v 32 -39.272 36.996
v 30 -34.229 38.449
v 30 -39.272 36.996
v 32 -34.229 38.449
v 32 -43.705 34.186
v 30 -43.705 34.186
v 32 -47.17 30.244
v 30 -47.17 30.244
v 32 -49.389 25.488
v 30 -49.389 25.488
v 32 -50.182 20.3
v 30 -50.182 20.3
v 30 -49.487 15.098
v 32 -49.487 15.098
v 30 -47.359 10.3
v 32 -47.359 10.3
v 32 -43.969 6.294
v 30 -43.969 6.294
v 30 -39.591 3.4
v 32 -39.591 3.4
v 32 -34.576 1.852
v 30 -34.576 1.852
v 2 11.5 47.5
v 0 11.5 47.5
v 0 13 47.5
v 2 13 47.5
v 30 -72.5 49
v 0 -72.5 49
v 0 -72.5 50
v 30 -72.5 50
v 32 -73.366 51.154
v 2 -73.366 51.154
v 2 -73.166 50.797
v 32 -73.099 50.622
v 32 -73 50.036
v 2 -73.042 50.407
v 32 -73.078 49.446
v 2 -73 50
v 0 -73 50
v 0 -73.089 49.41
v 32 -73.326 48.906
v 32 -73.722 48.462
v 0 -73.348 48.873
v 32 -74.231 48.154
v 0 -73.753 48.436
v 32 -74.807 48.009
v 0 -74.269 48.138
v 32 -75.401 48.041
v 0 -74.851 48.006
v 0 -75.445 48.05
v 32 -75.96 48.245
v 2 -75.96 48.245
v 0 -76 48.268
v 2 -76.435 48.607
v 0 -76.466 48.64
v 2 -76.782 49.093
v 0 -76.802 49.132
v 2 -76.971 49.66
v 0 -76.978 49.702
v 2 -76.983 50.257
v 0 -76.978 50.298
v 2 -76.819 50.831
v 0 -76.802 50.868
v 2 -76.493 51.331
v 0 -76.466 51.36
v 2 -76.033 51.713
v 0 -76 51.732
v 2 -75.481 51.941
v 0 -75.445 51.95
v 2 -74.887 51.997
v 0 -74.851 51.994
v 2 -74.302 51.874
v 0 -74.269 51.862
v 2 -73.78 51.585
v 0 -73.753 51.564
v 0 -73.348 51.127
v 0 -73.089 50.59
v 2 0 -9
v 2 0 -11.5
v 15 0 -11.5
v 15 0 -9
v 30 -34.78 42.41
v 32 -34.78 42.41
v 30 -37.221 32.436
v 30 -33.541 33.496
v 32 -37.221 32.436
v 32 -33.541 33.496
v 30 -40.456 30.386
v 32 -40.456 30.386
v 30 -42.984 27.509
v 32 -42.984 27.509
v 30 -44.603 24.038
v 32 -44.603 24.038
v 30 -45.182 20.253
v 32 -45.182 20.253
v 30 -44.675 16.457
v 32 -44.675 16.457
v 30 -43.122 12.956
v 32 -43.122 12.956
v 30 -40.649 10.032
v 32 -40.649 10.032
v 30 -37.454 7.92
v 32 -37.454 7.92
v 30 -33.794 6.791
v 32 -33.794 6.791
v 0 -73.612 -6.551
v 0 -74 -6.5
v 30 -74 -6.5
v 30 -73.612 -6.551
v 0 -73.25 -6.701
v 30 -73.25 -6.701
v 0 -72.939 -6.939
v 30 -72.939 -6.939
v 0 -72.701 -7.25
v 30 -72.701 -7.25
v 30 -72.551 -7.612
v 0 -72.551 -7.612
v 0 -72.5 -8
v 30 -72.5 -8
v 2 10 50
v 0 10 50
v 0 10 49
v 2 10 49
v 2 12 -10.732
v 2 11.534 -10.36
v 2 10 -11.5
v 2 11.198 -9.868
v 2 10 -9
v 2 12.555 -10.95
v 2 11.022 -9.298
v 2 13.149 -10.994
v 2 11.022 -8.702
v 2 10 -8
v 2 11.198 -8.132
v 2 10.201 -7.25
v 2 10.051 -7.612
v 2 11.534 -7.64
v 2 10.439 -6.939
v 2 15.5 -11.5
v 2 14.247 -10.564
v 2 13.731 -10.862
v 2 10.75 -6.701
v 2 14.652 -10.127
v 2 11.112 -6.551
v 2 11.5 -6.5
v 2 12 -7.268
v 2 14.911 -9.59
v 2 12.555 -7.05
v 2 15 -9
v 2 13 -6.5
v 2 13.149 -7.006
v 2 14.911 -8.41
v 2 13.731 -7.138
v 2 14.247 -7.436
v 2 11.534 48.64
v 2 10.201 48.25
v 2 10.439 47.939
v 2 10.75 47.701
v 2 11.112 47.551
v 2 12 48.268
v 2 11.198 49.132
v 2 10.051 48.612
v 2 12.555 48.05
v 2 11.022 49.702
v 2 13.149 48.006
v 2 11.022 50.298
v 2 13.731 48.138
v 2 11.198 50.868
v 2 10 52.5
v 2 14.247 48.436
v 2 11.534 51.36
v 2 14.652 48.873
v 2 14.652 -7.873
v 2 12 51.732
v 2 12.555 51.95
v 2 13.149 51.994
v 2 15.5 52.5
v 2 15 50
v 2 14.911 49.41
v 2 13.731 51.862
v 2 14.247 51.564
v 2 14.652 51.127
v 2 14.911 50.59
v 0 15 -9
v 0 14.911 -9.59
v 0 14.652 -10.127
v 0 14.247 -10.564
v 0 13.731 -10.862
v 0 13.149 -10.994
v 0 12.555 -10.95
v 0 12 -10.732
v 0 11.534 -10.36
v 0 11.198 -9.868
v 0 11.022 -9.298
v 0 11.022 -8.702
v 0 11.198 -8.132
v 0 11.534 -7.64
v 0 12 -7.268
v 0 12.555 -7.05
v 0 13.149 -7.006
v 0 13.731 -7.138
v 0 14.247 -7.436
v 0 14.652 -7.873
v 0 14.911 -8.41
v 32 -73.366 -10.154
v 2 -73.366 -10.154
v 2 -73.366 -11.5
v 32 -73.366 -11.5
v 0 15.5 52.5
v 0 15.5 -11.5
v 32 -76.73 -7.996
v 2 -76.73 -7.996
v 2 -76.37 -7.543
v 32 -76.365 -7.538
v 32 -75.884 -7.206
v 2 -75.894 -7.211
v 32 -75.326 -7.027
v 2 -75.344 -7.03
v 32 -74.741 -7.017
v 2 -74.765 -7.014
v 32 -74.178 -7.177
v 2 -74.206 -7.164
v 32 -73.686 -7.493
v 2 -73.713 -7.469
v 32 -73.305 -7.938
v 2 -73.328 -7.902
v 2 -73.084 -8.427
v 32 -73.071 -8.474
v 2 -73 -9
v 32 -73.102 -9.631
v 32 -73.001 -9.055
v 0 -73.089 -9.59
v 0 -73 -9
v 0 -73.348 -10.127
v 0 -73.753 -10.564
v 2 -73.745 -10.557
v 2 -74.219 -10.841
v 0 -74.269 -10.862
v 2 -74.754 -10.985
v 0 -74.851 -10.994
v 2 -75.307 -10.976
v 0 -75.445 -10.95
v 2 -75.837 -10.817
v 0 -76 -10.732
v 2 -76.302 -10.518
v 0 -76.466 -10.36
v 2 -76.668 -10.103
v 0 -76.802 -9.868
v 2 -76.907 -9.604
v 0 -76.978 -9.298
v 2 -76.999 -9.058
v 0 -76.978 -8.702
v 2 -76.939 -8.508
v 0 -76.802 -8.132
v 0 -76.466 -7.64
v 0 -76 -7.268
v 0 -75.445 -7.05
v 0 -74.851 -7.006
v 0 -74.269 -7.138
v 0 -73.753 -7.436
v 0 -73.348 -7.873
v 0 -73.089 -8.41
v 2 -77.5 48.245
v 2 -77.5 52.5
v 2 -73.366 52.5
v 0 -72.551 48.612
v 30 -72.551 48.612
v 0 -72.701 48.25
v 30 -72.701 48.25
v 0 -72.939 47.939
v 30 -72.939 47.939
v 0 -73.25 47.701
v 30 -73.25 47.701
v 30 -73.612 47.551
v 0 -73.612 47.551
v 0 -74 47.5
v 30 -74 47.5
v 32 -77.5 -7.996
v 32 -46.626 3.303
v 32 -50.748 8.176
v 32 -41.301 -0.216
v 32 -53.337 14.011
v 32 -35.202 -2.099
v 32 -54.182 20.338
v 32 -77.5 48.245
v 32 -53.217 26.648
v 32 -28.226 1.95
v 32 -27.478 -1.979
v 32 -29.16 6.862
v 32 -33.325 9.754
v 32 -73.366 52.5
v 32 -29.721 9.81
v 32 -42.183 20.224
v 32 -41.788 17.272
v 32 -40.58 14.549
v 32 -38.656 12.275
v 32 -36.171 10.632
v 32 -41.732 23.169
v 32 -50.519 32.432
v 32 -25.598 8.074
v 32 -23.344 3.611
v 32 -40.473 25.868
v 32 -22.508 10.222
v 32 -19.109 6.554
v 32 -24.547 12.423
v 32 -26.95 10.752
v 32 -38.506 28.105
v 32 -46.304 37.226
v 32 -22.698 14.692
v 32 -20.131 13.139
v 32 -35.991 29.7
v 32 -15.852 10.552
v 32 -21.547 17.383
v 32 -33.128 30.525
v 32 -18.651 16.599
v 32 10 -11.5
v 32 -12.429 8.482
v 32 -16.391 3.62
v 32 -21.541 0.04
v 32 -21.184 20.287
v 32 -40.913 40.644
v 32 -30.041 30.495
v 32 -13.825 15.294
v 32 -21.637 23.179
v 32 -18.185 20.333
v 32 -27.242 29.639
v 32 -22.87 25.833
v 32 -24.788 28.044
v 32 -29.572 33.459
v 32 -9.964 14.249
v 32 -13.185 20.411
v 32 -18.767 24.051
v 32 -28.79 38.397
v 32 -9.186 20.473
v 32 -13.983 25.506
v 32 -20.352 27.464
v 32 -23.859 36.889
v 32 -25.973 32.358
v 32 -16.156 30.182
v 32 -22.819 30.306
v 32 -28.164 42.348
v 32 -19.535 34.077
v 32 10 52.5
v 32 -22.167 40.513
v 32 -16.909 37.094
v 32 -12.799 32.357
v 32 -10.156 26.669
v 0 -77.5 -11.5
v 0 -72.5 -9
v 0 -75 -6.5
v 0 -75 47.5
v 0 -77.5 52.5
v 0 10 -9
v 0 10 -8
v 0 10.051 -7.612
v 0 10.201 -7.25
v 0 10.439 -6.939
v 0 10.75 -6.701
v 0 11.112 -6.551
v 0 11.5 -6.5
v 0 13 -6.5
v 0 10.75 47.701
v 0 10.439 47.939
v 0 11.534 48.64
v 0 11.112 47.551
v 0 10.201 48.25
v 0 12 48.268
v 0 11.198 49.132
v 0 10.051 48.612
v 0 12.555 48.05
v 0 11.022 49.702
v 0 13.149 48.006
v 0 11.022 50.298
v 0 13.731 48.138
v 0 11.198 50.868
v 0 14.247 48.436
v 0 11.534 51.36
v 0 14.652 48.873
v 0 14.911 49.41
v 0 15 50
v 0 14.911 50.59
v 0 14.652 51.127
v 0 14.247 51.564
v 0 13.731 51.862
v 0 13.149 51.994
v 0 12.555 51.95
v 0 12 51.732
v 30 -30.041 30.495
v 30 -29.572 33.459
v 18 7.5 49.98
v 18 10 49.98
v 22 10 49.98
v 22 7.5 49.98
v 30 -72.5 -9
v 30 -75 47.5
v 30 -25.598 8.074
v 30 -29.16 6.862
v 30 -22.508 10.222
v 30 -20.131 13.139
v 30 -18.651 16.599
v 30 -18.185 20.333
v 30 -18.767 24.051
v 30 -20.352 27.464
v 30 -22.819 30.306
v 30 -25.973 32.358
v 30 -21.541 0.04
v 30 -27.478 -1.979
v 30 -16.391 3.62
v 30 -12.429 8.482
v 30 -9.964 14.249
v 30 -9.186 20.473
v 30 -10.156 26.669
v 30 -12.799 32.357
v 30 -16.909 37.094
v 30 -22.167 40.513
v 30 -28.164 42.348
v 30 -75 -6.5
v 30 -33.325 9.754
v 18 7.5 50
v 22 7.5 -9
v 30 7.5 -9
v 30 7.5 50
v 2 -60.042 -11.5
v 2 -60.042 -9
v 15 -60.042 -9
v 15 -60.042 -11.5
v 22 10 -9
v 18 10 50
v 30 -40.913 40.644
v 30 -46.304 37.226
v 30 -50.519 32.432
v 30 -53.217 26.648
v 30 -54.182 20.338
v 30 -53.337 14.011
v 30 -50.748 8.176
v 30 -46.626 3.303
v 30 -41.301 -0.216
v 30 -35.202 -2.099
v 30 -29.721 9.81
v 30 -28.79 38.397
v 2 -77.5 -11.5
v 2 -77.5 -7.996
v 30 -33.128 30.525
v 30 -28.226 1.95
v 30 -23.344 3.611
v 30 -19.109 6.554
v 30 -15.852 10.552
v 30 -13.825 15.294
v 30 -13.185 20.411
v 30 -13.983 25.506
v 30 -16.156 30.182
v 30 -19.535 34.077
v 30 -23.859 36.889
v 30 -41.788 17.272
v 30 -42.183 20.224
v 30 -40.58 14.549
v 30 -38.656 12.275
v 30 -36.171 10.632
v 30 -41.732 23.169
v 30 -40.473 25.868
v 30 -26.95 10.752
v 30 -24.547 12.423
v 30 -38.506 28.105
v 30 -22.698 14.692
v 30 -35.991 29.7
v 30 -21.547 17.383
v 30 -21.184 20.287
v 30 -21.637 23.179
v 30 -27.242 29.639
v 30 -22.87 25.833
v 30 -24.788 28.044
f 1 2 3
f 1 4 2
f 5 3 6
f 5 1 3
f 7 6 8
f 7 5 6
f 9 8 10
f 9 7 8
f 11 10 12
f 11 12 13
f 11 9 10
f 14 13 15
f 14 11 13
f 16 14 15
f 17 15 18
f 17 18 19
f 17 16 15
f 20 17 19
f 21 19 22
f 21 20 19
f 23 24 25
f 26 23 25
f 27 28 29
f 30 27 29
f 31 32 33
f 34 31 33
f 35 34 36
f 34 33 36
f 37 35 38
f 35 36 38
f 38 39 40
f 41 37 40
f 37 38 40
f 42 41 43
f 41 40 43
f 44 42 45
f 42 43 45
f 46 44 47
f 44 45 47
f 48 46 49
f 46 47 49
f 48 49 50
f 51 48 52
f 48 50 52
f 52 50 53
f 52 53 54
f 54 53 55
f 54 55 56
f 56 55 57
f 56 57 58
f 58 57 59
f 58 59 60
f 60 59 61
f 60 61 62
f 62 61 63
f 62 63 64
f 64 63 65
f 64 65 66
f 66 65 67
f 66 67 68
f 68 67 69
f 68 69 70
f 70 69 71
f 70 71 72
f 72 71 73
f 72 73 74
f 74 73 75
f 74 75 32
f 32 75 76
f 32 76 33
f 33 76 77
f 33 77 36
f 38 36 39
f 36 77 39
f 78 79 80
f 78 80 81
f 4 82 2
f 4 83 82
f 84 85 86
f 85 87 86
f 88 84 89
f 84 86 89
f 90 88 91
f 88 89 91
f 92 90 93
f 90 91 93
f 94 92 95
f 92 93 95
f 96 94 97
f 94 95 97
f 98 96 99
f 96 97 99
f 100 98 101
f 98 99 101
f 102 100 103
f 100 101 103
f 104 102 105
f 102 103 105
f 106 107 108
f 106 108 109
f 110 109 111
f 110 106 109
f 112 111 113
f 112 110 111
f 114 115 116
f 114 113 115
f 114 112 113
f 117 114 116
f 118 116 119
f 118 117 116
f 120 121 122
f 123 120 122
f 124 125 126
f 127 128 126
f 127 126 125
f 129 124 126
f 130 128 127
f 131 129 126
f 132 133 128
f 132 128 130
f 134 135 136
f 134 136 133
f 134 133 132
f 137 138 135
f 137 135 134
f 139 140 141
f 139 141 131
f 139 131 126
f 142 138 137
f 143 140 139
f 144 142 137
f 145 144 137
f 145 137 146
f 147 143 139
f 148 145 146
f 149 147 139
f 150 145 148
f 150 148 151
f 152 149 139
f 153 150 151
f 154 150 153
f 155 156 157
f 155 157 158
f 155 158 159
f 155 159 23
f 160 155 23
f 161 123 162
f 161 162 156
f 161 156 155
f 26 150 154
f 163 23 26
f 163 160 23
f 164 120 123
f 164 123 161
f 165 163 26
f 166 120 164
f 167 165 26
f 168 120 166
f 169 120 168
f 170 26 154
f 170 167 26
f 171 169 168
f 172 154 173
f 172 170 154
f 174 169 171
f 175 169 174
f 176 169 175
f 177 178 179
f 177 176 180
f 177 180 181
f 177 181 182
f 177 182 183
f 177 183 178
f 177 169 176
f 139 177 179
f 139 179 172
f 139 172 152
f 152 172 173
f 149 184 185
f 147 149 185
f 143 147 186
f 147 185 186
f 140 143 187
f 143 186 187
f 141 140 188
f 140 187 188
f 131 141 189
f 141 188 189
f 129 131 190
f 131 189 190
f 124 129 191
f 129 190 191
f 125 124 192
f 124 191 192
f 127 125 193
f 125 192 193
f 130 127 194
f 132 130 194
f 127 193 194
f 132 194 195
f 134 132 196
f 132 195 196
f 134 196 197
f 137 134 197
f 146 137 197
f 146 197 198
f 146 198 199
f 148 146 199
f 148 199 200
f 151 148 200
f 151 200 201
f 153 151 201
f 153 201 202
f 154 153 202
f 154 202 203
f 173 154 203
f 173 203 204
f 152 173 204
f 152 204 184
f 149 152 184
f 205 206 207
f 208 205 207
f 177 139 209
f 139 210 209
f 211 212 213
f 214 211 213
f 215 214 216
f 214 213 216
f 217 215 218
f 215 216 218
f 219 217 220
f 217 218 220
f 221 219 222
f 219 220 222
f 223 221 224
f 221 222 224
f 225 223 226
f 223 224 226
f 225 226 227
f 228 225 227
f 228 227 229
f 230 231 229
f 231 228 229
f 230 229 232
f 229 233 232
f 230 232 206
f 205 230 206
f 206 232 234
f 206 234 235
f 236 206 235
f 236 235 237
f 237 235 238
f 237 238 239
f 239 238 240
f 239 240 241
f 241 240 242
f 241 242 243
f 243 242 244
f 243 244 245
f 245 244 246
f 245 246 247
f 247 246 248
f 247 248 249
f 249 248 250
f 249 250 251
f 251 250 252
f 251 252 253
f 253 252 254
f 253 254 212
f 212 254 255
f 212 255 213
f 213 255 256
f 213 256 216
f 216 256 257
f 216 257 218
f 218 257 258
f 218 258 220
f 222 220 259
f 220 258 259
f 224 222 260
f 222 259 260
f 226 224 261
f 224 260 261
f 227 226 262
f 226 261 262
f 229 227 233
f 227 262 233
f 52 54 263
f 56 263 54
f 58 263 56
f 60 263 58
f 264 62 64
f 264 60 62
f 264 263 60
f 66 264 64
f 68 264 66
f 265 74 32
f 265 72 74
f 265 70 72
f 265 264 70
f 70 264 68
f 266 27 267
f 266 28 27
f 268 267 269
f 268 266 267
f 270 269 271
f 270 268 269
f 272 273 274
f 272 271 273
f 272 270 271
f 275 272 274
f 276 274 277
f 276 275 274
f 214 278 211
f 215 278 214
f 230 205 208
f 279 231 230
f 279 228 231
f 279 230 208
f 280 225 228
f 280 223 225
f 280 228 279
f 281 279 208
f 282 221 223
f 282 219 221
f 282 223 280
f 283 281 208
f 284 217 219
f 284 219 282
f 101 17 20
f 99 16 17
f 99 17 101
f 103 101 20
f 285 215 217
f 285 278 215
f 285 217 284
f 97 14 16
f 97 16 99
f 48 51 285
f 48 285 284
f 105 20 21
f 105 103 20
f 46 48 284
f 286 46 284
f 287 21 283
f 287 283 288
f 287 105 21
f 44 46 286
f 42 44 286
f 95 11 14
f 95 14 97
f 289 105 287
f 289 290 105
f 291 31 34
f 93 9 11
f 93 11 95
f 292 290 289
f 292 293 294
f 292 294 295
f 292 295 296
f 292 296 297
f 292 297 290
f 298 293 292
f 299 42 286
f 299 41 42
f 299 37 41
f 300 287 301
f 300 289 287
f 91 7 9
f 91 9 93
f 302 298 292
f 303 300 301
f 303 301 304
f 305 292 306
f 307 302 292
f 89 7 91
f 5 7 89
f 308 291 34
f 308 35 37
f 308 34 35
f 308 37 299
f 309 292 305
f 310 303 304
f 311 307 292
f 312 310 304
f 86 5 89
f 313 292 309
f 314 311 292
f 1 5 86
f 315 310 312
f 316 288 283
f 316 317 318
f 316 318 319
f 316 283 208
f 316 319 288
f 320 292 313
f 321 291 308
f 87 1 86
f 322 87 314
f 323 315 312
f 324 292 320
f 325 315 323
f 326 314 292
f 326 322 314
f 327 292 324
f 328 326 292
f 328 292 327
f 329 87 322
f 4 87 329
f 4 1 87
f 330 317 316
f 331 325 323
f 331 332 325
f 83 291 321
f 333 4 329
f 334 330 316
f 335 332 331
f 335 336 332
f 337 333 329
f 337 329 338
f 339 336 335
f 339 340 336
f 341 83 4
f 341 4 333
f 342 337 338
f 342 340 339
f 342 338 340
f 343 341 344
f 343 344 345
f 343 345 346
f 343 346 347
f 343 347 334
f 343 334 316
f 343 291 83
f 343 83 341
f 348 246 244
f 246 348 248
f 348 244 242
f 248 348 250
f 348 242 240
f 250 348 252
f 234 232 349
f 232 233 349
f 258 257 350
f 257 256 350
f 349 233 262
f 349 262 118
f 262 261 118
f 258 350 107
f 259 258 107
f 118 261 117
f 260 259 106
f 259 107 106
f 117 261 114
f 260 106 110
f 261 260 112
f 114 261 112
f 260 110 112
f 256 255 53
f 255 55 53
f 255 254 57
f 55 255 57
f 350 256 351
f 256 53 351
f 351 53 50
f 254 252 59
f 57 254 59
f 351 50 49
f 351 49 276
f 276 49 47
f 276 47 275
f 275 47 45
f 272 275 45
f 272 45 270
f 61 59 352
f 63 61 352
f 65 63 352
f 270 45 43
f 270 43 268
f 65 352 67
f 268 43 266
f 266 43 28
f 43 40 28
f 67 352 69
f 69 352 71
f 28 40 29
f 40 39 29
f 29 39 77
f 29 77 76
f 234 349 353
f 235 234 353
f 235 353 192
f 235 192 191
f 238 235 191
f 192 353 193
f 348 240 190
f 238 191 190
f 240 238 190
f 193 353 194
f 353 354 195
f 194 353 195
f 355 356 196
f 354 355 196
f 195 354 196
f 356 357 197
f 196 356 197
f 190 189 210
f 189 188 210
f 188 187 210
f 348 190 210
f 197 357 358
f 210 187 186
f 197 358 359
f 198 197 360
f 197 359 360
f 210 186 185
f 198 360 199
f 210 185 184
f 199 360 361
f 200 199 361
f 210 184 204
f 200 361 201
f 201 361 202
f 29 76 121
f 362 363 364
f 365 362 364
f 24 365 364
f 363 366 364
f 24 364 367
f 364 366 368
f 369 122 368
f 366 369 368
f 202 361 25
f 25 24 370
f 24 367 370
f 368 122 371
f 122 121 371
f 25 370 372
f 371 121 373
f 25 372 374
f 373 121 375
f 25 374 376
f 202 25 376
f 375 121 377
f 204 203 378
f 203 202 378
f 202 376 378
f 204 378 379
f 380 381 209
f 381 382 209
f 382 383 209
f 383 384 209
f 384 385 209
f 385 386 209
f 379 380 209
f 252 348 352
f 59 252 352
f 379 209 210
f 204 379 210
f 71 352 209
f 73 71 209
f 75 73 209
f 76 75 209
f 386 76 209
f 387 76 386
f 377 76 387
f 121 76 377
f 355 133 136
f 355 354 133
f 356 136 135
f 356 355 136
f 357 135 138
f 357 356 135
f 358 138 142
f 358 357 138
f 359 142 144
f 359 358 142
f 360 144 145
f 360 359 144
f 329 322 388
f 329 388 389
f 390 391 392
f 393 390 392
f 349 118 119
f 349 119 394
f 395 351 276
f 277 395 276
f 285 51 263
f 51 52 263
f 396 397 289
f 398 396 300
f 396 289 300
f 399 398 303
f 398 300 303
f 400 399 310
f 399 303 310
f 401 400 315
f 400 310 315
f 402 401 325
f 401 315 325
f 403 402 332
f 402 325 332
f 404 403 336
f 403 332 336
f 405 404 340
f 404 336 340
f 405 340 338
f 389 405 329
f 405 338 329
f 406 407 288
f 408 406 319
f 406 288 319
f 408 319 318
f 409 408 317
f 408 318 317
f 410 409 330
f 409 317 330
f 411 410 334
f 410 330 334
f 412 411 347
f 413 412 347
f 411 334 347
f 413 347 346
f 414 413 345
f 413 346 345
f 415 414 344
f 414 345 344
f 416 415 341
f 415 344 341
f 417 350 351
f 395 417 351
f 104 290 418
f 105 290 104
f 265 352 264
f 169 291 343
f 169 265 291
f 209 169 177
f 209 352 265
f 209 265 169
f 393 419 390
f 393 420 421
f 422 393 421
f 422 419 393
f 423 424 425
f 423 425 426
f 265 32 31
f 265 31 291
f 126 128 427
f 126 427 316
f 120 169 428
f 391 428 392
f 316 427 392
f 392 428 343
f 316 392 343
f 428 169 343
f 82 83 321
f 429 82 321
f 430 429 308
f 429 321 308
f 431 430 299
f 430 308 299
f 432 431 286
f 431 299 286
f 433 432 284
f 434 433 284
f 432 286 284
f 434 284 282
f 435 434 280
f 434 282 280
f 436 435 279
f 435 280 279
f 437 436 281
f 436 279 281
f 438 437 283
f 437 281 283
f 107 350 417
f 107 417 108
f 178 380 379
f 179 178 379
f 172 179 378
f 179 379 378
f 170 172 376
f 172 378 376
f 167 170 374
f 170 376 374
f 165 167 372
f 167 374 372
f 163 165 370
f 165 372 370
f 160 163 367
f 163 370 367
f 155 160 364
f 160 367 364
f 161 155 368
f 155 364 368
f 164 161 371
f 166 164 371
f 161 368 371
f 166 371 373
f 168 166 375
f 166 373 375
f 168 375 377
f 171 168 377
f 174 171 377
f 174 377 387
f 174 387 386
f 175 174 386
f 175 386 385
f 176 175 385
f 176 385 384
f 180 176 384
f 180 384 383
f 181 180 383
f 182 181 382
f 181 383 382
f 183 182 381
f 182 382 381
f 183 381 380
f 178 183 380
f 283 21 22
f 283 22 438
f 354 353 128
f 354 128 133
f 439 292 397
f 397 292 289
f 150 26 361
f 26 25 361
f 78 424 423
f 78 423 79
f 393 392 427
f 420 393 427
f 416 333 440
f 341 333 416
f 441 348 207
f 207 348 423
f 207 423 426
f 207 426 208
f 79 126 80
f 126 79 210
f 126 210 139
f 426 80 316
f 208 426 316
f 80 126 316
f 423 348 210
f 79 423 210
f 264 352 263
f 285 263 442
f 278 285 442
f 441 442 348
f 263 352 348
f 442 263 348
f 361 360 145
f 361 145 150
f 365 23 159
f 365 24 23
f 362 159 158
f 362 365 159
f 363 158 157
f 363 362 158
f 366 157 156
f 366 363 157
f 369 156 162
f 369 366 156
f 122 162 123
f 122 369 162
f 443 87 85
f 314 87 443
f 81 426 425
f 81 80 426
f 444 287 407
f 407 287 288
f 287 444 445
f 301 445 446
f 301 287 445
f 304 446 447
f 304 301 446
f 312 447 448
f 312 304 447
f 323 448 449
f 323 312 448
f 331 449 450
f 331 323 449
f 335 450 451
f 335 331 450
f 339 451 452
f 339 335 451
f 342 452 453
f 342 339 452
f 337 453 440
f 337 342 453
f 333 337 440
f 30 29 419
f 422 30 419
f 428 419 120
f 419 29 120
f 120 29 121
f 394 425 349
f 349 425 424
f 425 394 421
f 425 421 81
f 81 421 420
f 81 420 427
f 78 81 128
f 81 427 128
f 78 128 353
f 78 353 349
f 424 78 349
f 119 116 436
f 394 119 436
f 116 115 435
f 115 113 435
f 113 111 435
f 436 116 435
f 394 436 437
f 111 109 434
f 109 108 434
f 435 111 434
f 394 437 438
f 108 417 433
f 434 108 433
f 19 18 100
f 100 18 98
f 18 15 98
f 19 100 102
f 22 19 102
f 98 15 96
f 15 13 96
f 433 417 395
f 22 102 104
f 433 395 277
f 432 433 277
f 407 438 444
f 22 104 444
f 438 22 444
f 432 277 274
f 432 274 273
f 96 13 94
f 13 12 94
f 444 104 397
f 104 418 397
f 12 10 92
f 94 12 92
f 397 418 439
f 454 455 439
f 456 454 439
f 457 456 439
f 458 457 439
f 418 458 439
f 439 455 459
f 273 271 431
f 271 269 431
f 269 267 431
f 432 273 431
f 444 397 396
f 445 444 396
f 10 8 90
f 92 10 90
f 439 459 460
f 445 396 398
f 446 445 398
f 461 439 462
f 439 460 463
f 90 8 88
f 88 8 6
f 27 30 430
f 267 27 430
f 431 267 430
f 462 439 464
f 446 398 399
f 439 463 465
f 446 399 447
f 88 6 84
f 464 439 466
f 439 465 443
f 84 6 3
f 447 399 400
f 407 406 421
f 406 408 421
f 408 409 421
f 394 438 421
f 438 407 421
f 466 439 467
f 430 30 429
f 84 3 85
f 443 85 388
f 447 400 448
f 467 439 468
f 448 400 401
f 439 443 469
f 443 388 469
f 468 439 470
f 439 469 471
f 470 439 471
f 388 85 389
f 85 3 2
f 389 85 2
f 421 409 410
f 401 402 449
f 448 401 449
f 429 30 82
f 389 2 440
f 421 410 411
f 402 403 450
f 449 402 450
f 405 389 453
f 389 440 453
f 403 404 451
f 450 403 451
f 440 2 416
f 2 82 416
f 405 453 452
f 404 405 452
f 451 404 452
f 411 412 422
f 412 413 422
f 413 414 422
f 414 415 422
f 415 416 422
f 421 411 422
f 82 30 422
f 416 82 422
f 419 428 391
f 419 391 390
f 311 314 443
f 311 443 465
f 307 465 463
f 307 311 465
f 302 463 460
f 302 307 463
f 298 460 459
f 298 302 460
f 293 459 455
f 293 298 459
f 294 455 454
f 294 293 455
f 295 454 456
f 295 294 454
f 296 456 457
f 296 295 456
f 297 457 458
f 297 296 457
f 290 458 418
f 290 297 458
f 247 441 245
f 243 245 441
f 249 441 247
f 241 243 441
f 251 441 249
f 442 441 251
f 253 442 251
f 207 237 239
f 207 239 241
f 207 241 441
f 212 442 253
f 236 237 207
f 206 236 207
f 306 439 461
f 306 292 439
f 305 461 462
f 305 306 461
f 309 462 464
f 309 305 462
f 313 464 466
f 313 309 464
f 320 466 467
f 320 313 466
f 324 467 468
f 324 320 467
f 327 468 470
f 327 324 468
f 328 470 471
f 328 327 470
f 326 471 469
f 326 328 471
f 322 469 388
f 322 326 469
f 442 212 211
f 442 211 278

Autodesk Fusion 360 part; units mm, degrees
sketch "Sketch1" plane through (0, 0, 0) normal (1, 0, 0) x (0, 1, 0)
  line L0 (-75, 50) -> (13, 50)
  line L1 (13, 50) -> (13, -9)
  line L2 (13, -9) -> (-75, -9)
  line L3 (-75, -9) -> (-75, 50)
  circle A0 centre (-75, 50) radius 2
  circle A1 centre (13, 50) radius 2
  circle A2 centre (-75, -9) radius 2
  circle A3 centre (13, -9) radius 2
  line L4 (-77.5, 52.5) -> (-77.5, 47.5)
  line L5 (-77.5, 47.5) -> (-74, 47.5)
  line L6 (-72.5, 49) -> (-72.5, 52.5)
  line L7 (-72.5, 52.5) -> (10, 52.5)
  line L8 (10, 52.5) -> (10, 49)
  line L9 (11.5, 47.5) -> (15.5, 47.5)
  line L10 (15.5, 47.5) -> (15.5, 52.5)
  line L11 (15.5, 52.5) -> (10, 52.5)
  line L12 (-75, 20.5) -> (-35, 20.5)
  line L13 (-77.5, -11.5) -> (-77.5, -6.5)
  line L14 (-77.5, -6.5) -> (-74, -6.5)
  line L15 (-72.5, -8) -> (-72.5, -11.5)
  line L16 (-72.5, -11.5) -> (10, -11.5)
  line L17 (10, -11.5) -> (10, -8)
  line L18 (11.5, -6.5) -> (15.5, -6.5)
  line L19 (15.5, -6.5) -> (15.5, -11.5)
  line L20 (15.5, -11.5) -> (10, -11.5)
  line L21 (-77.5, 52.5) -> (-72.5, 52.5)
  line L22 (-77.5, 47.5) -> (-77.5, -11.5)
  line L23 (-77.5, -11.5) -> (-72.5, -11.5)
  arc A4 (-74, 47.5) -> (-72.5, 49) centre (-74, 49) ccw
  arc A5 (-72.5, -8) -> (-74, -6.5) centre (-74, -8) ccw
  arc A6 (11.5, -6.5) -> (10, -8) centre (11.5, -8) ccw
  arc A7 (10, 49) -> (11.5, 47.5) centre (11.5, 49) ccw
  line L24 (15.5, 47.5) -> (15.5, -6.5)
  dimension "d1" = 88
  dimension "d2" = 59
  dimension "d3" = 4
  dimension "d4" = 4
  dimension "d5" = 4
  dimension "d6" = 4
  dimension "d7" = 1.5
extrude "Extrude1" add sketch "Sketch1" along normal blind 2 contours L0 L3 A0 L4 L5 L6 L21 | L0 L3 A0 L5 L6 A4 | L0 L6 L7 L8 | L3 L5 L14 L22 | L0 L1 A1 L8 L9 L10 L11 | L0 L1 A1 L8 L9 A7 | L2 L3 A2 L14 L15 A5 | L2 L3 A2 L13 L14 L15 L22 L23 | L1 L9 L18 L24 | L2 L15 L16 L17 | L1 L2 A3 L17 L18 L19 L20 | L1 L2 A3 L17 L18 A6
sketch "Sketch2" plane through (2, 0, 0) normal (1, 0, 0) x (0, 1, 0)
  line L0 (-74, -6.5) -> (-75, -6.5)
  line L1 (-75, -6.5) -> (-75, 47.5)
  line L2 (-75, 47.5) -> (-74, 47.5)
  arc A0 (-74, 47.5) -> (-72.5, 49) centre (-74, 49) ccw
  line L3 (-72.5, 49) -> (-72.5, 50)
  line L4 (-72.5, 50) -> (10, 50)
  line L5 (10, 50) -> (10, 49)
  arc A1 (10, 49) -> (11.5, 47.5) centre (11.5, 49) ccw
  line L6 (11.5, 47.5) -> (13, 47.5)
  line L7 (13, 47.5) -> (13, -6.5)
  line L8 (13, -6.5) -> (11.5, -6.5)
  arc A2 (11.5, -6.5) -> (10, -8) centre (11.5, -8) ccw
  line L9 (10, -8) -> (10, -9)
  line L10 (10, -9) -> (-72.5, -9)
  line L11 (-72.5, -9) -> (-72.5, -8)
  arc A3 (-72.5, -8) -> (-74, -6.5) centre (-74, -8) ccw
  circle A4 centre (13, 50) radius 2
  circle A5 centre (13, -9) radius 2
  circle A6 centre (-75, -9) radius 2
  circle A7 centre (-75, 50) radius 2
  line L12 (15.5, 52.5) -> (-77.5, 52.5)
  line L13 (-77.5, 52.5) -> (-77.5, -11.5)
  line L14 (-77.5, -11.5) -> (15.5, -11.5)
  line L15 (15.5, -11.5) -> (15.5, 52.5)
  line L16 (-75.9596, 48.2453) -> (-77.5, 48.2453)
  line L17 (-73.3661, 51.1535) -> (-73.3661, 52.5)
  line L18 (-76.7298, -7.9961) -> (-77.5, -7.9961)
  line L19 (-73.3661, -10.1535) -> (-73.3661, -11.5)
  line L20 (-60.0421, -9) -> (-60.0421, -11.5)
  line L21 (10, 50) -> (10, 52.5)
  line L22 (0, -11.5) -> (0, -9)
  line L23 (10, -9) -> (10, -11.5)
extrude "Extrude2" add sketch "Sketch2" along normal blind 30 contours L0 L1 L2 A0 L3 L4 L10 L11 A3 A6 A7 L12 L13 L14 L16 L17 L18 L19 L20 L21 | L10 L14 L22 L23
sketch "Sketch3" plane through (0, 0, 50) normal (0, 0, -1) x (1, 0, 0)
  line L0 (0, 72.5) -> (0, -10)
  line L1 (0, -10) -> (2, -10)
  line L2 (2, -10) -> (32, -10)
  line L3 (32, -10) -> (32, 72.5)
  line L4 (32, 72.5) -> (0, 72.5)
  line L5 (32, -10) -> (18, -10)
  line L6 (18, -10) -> (18, -7.5)
  line L7 (18, -7.5) -> (32, -7.5)
  line L8 (32, -7.5) -> (32, -10)
  dimension "d12" = 14
  dimension "d13" = 2.5
extrude "Extrude3" add sketch "Sketch3" along normal up to surface (59 mm away) contours L2 L3 L5 L6 L7 L8
sketch "Sketch4" plane through (0, 0, 0) normal (0, -1, 0) x (1, 0, 0)
  line L0 (2, -9) -> (2, -11.5)
  line L1 (2, -11.5) -> (32, -11.5)
  line L2 (32, -11.5) -> (32, -9)
  line L3 (32, -9) -> (2, -9)
  line L4 (32, -11.5) -> (15, -11.5)
  line L5 (15, -11.5) -> (15, -9)
  line L6 (15, -9) -> (32, -9)
  line L7 (32, -9) -> (32, -11.5)
extrude "Extrude4" add sketch "Sketch4" along normal up to surface (60.0421 mm away) contours L1 L2 L3 L4 L5 L6 L7
sketch "Sketch5" plane through (0, 10, 0) normal (0, 1, 0) x (-1, 0, 0)
  line L0 (-2, -11.5) -> (-2, -9)
  line L1 (-2, -9) -> (-18, -9)
  line L2 (-18, -9) -> (-18, 50)
  line L3 (-18, 50) -> (-2, 50)
  line L4 (-2, 50) -> (-2, 52.5)
  line L5 (-2, 52.5) -> (-32, 52.5)
  line L6 (-32, 52.5) -> (-32, -11.5)
  line L7 (-32, -11.5) -> (-2, -11.5)
  line L8 (-18, 29.9805) -> (-22, 29.9805)
  line L9 (-22, 29.9805) -> (-22, -9)
  line L10 (-22, -9) -> (-18, -9)
extrude "Extrude5" cut sketch "Sketch5" against normal blind 6 contours L2 L8 L9 L10
sketch "Sketch6" plane through (32, 0, 0) normal (1, 0, 0) x (0, 1, 0)
  line L0 (-73.3661, -11.5) -> (10, -11.5)
  line L1 (10, -11.5) -> (10, 52.5)
  line L2 (10, 52.5) -> (-73.3661, 52.5)
  line L3 (-73.3661, 52.5) -> (-73.3661, 51.1535)
  arc A0 (-75.9596, 48.2453) -> (-73.3661, 51.1535) centre (-75, 50) ccw
  line L4 (-75.9596, 48.2453) -> (-77.5, 48.2453)
  line L5 (-77.5, 48.2453) -> (-77.5, -7.9961)
  line L6 (-77.5, -7.9961) -> (-76.7298, -7.9961)
  arc A1 (-73.3661, -10.1535) -> (-76.7298, -7.9961) centre (-75, -9) ccw
  line L7 (-73.3661, -10.1535) -> (-73.3661, -11.5)
  line L8 (7.5, -9) -> (-72.5, -9)
  line L9 (-72.5, -9) -> (-72.5, -8)
  arc A2 (-72.5, -8) -> (-74, -6.5) centre (-74, -8) ccw
  line L10 (-74, -6.5) -> (-75, -6.5)
  line L11 (-75, -6.5) -> (-75, 47.5)
  line L12 (-75, 47.5) -> (-74, 47.5)
  arc A3 (-74, 47.5) -> (-72.5, 49) centre (-74, 49) ccw
  line L13 (-72.5, 49) -> (-72.5, 50)
  line L14 (-72.5, 50) -> (7.5, 50)
  line L15 (7.5, 50) -> (7.5, -9)
  line L16 (-75, 47.5) -> (-73.5326, 47.9393)
  line L17 (-73.5326, 47.9393) -> (-72.7, 50.4)
  line L18 (-72.7, 50.4) -> (9, 51)
  line L19 (9, 51) -> (9, -10.6409)
  line L20 (9, -10.6409) -> (-72.5, -10.6409)
  line L21 (-72.5, -10.6409) -> (-73, -7.5)
  line L22 (-73, -7.5) -> (-74.2896, -6.8066)
  line L23 (-74.2896, -6.8066) -> (-75.5, -6.5)
  line L24 (-75.5, -6.5) -> (-75, 47.5)
extrude "Extrude6" add sketch "Sketch6" against normal blind 2 contours L8 L9 A2 L10 L11 L12 A3 L13 L14 L15
sketch "Sketch7" plane through (32, 0, 0) normal (1, 0, 0) x (0, 1, 0)
  line L0 (-73.3661, -11.5) -> (10, -11.5)
  line L1 (10, -11.5) -> (10, 52.5)
  line L2 (10, 52.5) -> (-73.3661, 52.5)
  line L3 (-73.3661, 52.5) -> (-73.3661, 51.1535)
  arc A0 (-75.9596, 48.2453) -> (-73.3661, 51.1535) centre (-75, 50) ccw
  line L4 (-75.9596, 48.2453) -> (-77.5, 48.2453)
  line L5 (-77.5, 48.2453) -> (-77.5, -7.9961)
  line L6 (-77.5, -7.9961) -> (-76.7298, -7.9961)
  arc A1 (-73.3661, -10.1535) -> (-76.7298, -7.9961) centre (-75, -9) ccw
  line L7 (-73.3661, -10.1535) -> (-73.3661, -11.5)
  circle A2 centre (-31.6831, 20.1246) radius 22.5
  circle A3 centre (-31.6831, 20.1246) radius 18.5
  circle A4 centre (-31.6831, 20.1246) radius 13.5
  circle A5 centre (-31.6831, 20.1246) radius 10.5
  circle A6 centre (-31.6831, 20.1246) radius 5.7443
  line L8 (-34.7796, 42.4105) -> (-31.6831, 20.1246)
  line L9 (-31.6831, 20.1246) -> (-28.1645, 42.3477)
  line L10 (-31.6831, 20.1246) -> (-35.2016, -2.0986)
  line L11 (-31.6831, 20.1246) -> (-27.4785, -1.9791)
  dimension "d22" = 45
  dimension "d23" = 37
  dimension "d24" = 27
  dimension "d25" = 21
extrude "Extrude7" cut sketch "Sketch7" against normal blind 4 contours A2 A3 L9 L11 | A2 A3 L8 L10 | A4 A5 L9 L11 | A4 A5 L8 L10
extrude "Extrude8" cut 1 faces at (19.3333, 9.1667, 29.9805) along direction (0, 0, 1) blind 20
